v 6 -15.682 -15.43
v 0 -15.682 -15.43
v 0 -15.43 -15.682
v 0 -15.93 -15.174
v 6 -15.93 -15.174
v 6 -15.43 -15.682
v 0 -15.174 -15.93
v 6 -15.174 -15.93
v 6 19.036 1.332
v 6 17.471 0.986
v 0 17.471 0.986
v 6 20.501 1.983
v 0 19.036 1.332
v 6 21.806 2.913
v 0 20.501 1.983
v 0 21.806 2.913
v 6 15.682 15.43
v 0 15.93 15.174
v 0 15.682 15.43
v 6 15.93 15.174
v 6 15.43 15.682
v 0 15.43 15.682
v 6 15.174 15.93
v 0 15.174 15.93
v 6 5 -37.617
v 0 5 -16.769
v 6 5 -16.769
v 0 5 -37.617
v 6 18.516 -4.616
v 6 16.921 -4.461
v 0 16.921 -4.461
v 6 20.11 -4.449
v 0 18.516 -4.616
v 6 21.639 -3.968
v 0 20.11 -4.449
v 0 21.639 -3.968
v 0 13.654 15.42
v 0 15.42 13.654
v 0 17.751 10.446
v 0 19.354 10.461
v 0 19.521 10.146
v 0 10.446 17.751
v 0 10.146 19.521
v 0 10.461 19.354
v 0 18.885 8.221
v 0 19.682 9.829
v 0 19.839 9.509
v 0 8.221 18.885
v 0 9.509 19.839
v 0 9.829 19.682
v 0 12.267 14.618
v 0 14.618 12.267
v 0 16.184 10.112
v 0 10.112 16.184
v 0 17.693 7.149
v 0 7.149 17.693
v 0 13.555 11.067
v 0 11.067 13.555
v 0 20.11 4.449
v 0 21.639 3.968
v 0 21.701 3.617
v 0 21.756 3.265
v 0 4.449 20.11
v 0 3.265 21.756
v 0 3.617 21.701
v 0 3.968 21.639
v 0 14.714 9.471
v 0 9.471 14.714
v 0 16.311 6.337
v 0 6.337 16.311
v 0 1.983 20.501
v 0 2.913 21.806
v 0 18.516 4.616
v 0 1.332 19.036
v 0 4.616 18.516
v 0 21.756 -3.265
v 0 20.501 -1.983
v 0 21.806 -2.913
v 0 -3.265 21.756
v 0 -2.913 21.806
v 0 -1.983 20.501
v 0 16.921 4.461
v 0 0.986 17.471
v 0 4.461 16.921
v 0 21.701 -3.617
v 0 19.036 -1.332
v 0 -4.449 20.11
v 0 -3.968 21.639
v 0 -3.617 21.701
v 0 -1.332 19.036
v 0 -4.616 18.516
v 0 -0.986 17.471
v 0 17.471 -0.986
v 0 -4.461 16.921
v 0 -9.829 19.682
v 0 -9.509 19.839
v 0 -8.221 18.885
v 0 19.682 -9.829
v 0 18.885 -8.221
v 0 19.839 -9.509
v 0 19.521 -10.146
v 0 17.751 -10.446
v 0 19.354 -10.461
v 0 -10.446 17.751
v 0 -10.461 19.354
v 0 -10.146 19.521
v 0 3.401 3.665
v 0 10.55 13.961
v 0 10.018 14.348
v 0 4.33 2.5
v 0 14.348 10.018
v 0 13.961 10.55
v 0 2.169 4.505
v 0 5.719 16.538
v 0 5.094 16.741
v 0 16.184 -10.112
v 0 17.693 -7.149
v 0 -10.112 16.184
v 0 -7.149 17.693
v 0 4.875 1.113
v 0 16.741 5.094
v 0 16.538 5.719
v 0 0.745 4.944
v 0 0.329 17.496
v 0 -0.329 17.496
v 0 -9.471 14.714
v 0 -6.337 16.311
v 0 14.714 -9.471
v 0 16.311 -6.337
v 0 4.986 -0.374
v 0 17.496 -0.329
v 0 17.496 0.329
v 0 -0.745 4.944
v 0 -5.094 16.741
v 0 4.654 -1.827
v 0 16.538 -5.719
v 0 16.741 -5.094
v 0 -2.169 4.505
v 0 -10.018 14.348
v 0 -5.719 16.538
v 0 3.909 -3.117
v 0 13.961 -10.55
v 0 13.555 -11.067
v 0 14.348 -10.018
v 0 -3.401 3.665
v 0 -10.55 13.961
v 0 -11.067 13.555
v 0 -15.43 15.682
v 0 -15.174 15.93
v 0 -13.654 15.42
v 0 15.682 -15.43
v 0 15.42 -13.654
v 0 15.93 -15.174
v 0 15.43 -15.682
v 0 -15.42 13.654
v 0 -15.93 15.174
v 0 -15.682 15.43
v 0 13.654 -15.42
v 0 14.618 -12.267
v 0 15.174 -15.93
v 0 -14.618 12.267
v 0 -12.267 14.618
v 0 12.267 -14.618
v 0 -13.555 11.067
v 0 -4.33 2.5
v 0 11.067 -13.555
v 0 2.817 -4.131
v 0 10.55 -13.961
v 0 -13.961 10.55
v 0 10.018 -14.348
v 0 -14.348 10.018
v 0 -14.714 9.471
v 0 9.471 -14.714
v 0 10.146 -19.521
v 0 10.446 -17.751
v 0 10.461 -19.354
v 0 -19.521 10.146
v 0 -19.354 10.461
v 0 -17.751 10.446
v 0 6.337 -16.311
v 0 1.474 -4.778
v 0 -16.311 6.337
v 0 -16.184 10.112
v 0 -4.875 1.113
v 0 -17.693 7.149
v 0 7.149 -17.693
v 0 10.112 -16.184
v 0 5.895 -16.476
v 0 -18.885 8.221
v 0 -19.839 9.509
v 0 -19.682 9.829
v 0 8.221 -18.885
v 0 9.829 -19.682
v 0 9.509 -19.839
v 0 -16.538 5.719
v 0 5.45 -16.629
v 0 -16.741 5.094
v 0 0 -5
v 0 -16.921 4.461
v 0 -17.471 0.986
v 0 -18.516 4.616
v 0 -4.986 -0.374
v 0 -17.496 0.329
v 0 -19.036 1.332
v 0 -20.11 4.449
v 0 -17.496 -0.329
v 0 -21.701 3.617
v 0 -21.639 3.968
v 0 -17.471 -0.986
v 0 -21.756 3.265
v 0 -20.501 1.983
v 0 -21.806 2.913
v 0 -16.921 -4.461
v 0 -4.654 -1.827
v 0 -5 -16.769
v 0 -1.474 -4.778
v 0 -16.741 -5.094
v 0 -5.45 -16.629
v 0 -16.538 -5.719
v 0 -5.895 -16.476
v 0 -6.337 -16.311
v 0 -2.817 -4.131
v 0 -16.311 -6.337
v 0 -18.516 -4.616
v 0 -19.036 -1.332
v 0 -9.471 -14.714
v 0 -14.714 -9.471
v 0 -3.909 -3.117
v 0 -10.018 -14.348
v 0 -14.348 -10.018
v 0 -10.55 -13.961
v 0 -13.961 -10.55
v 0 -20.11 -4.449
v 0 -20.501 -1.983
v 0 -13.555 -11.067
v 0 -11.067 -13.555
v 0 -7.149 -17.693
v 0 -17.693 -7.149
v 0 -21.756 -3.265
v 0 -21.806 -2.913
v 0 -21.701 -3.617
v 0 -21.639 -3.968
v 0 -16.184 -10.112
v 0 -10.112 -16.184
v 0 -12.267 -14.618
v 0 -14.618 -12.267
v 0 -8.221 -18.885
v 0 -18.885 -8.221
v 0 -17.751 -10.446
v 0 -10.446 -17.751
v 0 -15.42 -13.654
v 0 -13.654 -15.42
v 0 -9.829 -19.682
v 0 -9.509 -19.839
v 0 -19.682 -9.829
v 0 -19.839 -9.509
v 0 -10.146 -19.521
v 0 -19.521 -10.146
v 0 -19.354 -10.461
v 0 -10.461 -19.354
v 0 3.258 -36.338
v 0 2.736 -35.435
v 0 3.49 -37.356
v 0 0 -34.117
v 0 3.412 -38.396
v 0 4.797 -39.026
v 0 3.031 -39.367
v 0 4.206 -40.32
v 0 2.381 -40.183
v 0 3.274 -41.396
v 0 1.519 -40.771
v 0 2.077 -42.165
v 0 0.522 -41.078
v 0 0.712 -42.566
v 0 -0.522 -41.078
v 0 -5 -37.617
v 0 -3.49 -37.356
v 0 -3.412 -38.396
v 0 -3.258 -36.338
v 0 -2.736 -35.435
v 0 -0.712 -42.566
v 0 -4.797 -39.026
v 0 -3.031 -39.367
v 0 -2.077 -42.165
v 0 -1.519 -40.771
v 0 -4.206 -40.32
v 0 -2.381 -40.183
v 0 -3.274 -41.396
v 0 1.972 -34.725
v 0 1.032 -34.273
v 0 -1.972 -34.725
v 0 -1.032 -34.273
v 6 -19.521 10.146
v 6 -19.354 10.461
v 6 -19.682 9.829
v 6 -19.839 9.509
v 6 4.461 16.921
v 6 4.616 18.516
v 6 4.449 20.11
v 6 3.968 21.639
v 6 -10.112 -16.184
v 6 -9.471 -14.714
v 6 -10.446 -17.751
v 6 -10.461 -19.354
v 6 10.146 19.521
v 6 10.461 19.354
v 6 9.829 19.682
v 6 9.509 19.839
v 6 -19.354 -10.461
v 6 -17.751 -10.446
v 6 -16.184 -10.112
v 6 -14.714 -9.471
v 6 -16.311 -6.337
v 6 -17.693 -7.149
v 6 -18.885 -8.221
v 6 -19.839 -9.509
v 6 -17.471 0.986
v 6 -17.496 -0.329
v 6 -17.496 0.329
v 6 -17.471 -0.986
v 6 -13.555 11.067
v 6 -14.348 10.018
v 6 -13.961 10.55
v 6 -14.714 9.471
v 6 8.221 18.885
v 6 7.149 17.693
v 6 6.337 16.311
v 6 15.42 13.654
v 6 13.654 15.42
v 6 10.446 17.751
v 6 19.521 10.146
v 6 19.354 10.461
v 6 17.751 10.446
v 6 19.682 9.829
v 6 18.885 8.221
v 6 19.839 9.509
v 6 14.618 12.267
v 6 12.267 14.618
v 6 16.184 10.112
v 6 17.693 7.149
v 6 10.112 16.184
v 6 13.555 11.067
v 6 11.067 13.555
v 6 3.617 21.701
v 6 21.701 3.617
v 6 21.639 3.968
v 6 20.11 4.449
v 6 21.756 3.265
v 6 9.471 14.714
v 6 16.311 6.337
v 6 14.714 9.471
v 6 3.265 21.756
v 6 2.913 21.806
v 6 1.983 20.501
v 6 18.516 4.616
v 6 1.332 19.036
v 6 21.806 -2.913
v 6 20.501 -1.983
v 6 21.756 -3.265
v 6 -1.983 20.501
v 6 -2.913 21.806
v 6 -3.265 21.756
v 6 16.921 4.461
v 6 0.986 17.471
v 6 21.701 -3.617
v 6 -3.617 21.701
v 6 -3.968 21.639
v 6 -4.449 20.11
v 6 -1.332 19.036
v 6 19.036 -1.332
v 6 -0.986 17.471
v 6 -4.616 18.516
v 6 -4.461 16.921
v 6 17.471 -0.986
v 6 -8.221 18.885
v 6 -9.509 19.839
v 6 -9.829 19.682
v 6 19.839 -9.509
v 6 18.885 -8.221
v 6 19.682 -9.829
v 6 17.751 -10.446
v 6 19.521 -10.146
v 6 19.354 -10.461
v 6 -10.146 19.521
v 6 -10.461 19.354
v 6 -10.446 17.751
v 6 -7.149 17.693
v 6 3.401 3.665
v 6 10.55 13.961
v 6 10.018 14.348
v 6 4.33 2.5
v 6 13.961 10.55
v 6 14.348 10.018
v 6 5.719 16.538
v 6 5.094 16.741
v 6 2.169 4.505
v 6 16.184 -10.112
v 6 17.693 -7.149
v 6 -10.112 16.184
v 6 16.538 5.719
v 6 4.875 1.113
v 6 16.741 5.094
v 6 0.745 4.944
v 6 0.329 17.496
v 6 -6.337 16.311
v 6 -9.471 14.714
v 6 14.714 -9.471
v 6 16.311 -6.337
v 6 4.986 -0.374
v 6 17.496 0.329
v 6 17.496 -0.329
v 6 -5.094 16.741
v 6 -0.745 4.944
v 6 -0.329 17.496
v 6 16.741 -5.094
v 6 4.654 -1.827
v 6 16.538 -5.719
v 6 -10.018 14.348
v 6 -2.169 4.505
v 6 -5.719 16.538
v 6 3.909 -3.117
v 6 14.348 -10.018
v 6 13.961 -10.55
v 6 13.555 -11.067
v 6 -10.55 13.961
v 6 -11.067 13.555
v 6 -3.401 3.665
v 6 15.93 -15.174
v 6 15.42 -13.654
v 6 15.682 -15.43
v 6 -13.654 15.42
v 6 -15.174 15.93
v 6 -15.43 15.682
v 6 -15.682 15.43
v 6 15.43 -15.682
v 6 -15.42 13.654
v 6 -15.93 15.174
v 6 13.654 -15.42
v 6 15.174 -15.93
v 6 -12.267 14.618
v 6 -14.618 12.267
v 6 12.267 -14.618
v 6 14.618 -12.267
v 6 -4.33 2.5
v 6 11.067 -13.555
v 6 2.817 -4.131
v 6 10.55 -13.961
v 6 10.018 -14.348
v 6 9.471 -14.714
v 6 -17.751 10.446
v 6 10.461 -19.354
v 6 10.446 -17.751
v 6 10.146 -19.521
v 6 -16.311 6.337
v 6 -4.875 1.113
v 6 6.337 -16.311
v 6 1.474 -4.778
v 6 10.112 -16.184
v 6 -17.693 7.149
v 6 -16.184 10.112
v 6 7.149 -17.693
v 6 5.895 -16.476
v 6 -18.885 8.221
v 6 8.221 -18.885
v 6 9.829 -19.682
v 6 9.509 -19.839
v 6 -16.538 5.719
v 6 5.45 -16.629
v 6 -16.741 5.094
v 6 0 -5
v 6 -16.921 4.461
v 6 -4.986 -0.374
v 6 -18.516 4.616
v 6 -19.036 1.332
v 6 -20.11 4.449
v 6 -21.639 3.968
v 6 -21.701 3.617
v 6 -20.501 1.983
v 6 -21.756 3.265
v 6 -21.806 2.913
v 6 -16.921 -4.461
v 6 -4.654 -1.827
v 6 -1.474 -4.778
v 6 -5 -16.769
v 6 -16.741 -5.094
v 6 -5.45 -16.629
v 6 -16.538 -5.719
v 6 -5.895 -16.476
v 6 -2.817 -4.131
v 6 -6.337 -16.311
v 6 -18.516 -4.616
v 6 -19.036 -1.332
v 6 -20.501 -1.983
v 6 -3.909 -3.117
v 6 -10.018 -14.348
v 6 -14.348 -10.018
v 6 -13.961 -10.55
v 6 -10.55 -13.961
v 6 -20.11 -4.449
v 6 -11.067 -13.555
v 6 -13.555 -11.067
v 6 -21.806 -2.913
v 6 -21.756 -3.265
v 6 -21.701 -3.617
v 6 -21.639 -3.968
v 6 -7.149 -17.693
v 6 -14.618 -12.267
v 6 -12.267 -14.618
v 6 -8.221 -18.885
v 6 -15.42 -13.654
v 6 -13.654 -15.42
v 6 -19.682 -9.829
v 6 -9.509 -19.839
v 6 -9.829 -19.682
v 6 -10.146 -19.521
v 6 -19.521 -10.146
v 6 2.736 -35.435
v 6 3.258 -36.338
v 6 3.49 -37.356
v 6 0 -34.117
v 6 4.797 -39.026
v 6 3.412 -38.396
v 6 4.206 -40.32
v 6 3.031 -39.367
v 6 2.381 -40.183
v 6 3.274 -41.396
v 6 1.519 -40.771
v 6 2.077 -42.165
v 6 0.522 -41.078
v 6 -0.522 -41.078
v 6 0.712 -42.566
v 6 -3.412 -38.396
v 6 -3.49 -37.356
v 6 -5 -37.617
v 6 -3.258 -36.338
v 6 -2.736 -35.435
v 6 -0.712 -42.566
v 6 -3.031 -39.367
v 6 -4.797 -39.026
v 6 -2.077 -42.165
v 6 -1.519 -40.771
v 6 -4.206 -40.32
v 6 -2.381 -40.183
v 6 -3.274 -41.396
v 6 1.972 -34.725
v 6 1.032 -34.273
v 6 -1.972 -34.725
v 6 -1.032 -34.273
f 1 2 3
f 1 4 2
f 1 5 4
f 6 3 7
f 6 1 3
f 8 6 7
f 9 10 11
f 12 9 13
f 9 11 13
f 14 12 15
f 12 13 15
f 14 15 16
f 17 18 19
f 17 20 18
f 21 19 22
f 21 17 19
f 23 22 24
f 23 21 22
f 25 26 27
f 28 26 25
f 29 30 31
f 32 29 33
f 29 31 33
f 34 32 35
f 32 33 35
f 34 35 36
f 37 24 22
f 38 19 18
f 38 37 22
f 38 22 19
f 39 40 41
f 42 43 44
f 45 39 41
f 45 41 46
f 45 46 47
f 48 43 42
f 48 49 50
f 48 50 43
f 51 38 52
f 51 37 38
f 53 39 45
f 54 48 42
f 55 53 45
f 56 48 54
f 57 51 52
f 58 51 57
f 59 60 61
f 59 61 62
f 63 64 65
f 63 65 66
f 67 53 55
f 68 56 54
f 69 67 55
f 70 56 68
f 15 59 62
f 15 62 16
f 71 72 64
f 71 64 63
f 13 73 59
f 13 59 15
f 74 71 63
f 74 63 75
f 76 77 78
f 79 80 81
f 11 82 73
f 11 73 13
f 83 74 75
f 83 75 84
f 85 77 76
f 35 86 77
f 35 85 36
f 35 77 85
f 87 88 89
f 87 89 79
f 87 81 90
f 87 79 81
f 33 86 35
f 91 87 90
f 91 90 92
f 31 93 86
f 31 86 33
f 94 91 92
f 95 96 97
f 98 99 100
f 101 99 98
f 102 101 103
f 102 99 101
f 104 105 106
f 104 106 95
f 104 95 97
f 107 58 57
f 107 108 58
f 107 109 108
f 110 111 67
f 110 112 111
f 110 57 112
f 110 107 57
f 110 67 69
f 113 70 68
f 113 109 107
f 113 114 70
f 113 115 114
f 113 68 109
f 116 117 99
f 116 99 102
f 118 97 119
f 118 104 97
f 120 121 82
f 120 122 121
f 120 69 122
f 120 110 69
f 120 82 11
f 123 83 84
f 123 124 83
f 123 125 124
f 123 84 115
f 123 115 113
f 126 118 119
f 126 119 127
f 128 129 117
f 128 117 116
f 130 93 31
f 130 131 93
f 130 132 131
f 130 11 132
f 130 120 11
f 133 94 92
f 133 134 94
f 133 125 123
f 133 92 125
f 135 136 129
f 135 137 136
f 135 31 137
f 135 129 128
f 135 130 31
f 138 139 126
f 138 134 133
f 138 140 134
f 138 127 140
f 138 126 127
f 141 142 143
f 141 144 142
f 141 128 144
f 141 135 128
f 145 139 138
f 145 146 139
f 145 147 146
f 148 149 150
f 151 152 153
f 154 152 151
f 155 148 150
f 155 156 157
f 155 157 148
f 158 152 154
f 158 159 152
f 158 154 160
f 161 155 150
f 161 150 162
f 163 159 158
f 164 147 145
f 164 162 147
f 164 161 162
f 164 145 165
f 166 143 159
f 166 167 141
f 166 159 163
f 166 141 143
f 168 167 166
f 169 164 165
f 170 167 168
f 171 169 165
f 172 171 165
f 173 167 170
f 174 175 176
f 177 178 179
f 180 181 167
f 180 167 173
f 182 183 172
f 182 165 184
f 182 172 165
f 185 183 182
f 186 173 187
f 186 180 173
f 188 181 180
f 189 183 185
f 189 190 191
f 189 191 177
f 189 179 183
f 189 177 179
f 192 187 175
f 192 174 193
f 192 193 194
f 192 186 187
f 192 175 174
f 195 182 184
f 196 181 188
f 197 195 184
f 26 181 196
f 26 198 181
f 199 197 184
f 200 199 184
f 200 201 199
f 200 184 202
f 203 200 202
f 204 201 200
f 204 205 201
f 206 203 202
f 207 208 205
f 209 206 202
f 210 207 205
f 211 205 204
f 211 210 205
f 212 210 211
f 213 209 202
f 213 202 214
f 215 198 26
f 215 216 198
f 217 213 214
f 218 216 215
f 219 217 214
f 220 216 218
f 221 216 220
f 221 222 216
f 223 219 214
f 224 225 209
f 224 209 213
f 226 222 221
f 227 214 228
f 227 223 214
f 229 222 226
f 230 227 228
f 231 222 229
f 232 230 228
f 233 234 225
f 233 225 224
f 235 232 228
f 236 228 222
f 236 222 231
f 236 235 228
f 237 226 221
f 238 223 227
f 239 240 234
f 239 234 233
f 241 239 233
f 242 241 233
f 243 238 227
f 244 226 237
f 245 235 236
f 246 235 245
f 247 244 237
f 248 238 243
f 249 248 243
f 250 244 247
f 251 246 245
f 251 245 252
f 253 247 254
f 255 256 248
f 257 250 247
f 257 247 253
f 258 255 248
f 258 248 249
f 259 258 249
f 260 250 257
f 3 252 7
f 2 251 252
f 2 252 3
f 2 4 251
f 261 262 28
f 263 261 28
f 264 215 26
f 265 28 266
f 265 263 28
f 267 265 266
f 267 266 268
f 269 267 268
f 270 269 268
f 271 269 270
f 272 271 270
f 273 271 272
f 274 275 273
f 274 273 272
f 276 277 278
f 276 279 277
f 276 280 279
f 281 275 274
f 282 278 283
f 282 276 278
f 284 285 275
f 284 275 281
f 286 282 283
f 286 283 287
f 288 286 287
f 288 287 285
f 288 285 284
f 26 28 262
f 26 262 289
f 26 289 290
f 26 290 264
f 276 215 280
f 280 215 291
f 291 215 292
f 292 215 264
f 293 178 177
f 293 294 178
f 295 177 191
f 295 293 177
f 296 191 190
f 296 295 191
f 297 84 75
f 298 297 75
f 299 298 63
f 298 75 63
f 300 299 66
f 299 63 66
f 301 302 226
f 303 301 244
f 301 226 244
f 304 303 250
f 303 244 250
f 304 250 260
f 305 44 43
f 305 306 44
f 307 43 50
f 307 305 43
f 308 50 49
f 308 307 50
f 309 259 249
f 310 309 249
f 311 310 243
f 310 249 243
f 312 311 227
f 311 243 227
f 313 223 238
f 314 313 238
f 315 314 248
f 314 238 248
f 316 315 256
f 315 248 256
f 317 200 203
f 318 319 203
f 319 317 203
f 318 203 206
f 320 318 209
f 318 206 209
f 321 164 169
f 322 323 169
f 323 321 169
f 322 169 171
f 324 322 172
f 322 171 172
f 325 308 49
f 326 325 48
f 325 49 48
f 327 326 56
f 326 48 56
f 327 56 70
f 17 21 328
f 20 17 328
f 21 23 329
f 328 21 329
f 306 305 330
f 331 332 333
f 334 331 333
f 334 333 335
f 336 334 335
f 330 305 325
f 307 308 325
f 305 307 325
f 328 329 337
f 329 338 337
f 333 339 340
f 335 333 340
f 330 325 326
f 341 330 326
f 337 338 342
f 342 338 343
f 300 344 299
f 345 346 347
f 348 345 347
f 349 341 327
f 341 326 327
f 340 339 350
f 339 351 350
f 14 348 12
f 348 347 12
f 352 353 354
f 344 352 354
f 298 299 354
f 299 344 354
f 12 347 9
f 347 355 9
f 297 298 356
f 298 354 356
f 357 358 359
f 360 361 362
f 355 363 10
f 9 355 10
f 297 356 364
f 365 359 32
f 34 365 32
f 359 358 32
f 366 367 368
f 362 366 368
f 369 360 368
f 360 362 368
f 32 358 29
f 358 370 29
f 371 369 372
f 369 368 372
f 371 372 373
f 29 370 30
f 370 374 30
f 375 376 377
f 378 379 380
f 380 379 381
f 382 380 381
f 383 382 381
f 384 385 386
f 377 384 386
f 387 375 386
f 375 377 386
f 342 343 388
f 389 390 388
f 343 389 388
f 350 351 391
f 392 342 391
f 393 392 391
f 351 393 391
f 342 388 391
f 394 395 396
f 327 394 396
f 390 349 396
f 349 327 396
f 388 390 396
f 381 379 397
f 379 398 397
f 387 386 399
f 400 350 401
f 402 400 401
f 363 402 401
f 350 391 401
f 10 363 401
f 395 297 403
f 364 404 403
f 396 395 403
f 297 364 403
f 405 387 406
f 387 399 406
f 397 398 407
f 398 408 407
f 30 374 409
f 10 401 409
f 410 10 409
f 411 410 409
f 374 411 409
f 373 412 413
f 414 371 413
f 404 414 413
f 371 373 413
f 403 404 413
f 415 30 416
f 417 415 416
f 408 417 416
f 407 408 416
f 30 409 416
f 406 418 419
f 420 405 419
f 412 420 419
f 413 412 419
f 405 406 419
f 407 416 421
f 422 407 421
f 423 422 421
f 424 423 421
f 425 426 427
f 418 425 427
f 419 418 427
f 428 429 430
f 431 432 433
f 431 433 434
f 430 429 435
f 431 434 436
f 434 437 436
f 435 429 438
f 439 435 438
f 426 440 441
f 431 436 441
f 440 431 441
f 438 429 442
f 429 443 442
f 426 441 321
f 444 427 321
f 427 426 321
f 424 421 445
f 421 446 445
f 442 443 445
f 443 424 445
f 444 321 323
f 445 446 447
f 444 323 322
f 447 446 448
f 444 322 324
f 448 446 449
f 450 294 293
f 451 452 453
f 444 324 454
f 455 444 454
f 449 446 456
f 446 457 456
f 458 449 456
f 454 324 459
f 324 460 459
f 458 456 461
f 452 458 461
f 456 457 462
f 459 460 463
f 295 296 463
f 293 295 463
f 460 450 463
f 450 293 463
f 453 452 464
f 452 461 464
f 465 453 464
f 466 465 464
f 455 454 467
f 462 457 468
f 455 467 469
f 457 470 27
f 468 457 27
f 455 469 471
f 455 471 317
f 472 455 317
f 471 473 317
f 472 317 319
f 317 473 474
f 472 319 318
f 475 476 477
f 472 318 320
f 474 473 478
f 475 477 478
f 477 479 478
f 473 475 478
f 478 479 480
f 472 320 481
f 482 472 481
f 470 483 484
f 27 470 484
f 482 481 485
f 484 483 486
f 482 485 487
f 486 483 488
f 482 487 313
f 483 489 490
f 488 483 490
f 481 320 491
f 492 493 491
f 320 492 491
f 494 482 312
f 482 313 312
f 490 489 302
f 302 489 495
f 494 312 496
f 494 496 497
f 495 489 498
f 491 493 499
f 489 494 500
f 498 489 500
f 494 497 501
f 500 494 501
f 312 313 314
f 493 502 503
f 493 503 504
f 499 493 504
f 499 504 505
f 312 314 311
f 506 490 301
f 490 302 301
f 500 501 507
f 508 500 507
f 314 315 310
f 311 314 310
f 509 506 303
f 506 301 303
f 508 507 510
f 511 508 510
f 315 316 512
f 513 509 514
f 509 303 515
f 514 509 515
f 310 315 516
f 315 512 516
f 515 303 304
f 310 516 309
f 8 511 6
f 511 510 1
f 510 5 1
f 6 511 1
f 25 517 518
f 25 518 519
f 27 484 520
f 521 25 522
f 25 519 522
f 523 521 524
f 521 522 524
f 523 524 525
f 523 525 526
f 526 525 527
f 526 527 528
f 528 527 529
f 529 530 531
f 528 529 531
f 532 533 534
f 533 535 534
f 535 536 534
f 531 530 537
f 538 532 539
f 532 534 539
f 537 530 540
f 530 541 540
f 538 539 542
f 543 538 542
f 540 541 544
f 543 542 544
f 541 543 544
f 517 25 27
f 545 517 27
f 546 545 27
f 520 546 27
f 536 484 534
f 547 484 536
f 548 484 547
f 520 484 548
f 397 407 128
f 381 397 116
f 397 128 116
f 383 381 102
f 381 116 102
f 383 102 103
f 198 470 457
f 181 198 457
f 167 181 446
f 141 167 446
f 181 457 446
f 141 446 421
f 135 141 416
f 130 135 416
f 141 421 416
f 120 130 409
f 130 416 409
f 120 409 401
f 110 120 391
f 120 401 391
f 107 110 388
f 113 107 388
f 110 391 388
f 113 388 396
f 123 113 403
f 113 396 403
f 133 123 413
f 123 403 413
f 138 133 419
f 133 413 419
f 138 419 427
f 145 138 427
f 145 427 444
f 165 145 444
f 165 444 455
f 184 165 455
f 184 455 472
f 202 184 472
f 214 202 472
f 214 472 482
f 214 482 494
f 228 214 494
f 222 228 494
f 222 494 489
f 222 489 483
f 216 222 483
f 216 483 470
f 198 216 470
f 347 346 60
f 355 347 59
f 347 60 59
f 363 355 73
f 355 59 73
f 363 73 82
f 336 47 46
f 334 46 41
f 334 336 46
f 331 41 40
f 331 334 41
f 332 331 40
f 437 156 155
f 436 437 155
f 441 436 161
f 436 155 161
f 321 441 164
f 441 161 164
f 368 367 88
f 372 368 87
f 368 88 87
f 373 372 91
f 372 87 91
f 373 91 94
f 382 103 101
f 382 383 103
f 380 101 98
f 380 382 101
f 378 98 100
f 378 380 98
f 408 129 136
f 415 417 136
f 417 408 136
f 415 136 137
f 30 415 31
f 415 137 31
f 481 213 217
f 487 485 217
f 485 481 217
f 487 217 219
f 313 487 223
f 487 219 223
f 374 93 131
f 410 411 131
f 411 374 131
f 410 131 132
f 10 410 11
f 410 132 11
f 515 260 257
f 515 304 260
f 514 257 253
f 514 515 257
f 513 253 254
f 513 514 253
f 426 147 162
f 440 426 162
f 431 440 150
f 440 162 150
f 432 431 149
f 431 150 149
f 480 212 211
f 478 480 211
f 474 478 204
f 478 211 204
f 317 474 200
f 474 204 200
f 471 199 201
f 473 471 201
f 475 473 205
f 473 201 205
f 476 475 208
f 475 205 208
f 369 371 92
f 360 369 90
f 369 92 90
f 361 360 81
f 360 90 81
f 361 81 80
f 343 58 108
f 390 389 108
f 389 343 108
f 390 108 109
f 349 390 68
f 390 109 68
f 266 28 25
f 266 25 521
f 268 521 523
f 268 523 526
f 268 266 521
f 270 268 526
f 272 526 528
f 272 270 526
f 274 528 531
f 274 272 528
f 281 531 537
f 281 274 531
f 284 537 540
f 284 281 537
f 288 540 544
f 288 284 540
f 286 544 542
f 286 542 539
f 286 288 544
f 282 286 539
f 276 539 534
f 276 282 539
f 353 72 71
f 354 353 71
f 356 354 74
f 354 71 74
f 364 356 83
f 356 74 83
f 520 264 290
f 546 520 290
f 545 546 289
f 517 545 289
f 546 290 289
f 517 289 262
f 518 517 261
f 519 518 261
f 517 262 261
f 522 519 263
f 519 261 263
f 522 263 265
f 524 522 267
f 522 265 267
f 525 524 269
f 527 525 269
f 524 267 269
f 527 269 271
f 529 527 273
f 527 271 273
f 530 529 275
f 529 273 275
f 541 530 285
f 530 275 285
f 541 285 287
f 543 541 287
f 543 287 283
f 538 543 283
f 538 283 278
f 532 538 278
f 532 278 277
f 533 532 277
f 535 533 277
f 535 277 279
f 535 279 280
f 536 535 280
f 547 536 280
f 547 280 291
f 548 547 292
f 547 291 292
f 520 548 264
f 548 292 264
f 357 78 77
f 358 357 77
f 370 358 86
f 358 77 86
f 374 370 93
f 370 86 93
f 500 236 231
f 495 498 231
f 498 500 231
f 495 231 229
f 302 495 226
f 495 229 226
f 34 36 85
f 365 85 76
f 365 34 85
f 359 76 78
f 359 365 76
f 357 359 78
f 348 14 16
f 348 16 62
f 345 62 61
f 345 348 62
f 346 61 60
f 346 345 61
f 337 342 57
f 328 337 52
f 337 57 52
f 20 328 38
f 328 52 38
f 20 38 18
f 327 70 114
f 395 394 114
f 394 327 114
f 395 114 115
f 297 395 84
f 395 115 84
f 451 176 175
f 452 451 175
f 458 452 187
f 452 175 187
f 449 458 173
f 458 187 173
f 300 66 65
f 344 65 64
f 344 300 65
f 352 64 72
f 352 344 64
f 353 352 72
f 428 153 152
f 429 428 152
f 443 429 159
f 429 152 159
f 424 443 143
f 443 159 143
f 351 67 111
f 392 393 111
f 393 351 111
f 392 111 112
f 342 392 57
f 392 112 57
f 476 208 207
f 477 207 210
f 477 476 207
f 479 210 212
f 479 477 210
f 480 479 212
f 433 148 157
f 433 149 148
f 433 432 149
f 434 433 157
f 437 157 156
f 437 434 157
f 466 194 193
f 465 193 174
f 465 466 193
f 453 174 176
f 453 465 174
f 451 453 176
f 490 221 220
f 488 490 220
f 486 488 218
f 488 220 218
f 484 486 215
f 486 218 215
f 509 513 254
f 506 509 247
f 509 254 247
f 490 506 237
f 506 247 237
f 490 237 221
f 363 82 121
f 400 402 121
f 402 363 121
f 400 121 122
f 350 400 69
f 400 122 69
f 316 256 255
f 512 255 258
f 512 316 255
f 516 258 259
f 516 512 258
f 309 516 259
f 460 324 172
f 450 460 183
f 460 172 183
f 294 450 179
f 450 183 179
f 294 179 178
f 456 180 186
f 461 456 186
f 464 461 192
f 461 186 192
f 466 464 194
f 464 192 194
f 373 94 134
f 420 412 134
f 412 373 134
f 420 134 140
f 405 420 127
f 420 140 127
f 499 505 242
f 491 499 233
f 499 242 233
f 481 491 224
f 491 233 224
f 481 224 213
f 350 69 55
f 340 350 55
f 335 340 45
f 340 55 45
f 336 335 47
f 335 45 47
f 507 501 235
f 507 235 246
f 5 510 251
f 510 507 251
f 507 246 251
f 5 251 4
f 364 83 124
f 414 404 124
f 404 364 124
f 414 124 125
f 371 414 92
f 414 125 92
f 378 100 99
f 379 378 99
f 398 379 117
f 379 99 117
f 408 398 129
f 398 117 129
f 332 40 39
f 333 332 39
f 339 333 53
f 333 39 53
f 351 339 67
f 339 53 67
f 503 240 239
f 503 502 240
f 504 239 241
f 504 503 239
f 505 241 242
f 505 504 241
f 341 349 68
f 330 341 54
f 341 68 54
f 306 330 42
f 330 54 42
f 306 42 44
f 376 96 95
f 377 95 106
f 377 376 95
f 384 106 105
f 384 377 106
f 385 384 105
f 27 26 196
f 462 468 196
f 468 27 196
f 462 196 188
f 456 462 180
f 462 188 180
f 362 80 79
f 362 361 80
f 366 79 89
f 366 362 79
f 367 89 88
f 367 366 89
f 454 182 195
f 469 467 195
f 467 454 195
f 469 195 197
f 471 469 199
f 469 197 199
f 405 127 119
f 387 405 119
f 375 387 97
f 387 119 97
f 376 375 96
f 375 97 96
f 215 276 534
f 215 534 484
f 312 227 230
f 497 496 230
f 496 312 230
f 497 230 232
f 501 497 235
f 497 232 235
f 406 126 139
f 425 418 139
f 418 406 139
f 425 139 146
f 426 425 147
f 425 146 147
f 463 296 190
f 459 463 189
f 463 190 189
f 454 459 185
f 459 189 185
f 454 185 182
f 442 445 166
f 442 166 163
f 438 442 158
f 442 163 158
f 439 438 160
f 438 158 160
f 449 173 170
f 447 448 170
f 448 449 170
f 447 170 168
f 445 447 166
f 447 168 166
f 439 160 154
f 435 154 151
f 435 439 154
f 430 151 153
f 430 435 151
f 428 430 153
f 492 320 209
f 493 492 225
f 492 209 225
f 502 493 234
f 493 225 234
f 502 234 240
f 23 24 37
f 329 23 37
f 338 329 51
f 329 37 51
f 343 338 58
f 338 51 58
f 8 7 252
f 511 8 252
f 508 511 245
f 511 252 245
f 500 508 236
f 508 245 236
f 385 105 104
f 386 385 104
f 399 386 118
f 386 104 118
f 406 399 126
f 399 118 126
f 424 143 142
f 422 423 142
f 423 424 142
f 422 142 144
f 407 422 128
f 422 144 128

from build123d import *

# Parameters (mm, degrees)
BASPROSKE_W         = 6
BASPROSKE_H         = 22
TOOTHCUT_DEPTH      = 32.685959036
TEETHCUTS_COUNT     = 20
TEETHCUTS_ANGLE     = 342
BORSKE_R            = 2
BORE_DEPTH          = 50.0000508
SKETCH1_R           = 5
CUT_EXTRUDE1_DEPTH  = 32.417071791
BOSS_EXTRUDE1_DEPTH = 6
SKETCH3_R           = 3.5
CUT_EXTRUDE2_DEPTH  = 6


with BuildPart() as part:
    # BasProSke → Base-Revolve (revolve)
    with BuildSketch(Plane(origin=(0, 0, 0), x_dir=(1, 0, 0), z_dir=(0, 1, 0)), mode=Mode.PRIVATE) as base_revolve_sk:
        with Locations((3, 11)):
            Rectangle(BASPROSKE_W, BASPROSKE_H)
    revolve(base_revolve_sk.sketch.rotate(Axis((-10, 0, 0), (1, 0, 0)), 180), axis=Axis((-10, 0, 0), (1, 0, 0)))

    # TooCutSke → ToothCut (cut, through all)
    with BuildSketch(Plane(origin=(0, 0, 0), x_dir=(0, 0, -1), z_dir=(1, 0, 0))):
        with BuildLine():
            ThreePointArc((0.986171591, 17.471189616), (0, 17.499), (-0.986171591, 17.471189616))
            ThreePointArc((-0.986171591, 17.471189616), (-1.626916196, 19.798789858), (-2.932850173, 21.829260982))
            ThreePointArc((-2.932850173, 21.829260982), (0, 22.0254), (2.932850173, 21.829260982))
            ThreePointArc((2.932850173, 21.829260982), (1.626916196, 19.798789858), (0.986171591, 17.471189616))
        make_face()
    toothcut = extrude(amount=TOOTHCUT_DEPTH, mode=Mode.SUBTRACT)

    # TeethCuts: ToothCut ×20 about axis
    teethcuts_axis = Axis((-10, 0, 0), (1, 0, 0))
    for i in range(1, TEETHCUTS_COUNT):
        add(toothcut.rotate(teethcuts_axis, i * TEETHCUTS_ANGLE / (TEETHCUTS_COUNT - 1)), mode=Mode.SUBTRACT)

    # BorSke → Bore (cut, symmetric)
    with BuildSketch(Plane(origin=(0, 0, 0), x_dir=(0, 0, -1), z_dir=(1, 0, 0))):
        with Locations(Location((0, 0, 0), (0, 0, 180))):
            Circle(BORSKE_R)
    extrude(amount=BORE_DEPTH, both=True, mode=Mode.SUBTRACT)

    # Sketch1 → Cut-Extrude1 (cut, through all)
    with BuildSketch(Plane(origin=(6, 0, 0), x_dir=(0, 0, -1), z_dir=(1, 0, 0))):
        Circle(SKETCH1_R)
    extrude(amount=-CUT_EXTRUDE1_DEPTH, mode=Mode.SUBTRACT)

    # Sketch2 → Boss-Extrude1 (add)
    with BuildSketch(Plane.ZY):
        with BuildLine():
            Line((-37.617140139, -5), (-8.966472533, -5))
            Line((-8.966472533, -5), (-8.966472533, 5))
            Line((-8.966472533, 5), (-37.617140139, 5))
            ThreePointArc((-37.617140139, 5), (-34.081606234, 3.535533906), (-32.617140139, 0))
            ThreePointArc((-32.617140139, 0), (-34.081606234, -3.535533906), (-37.617140139, -5))
        make_face()
        with BuildLine():
            ThreePointArc((-37.617140139, 5), (-42.617140139, 0), (-37.617140139, -5))
            Line((-37.617140139, -5), (-37.617140139, 5))
        make_face()
        with BuildLine():
            Line((-37.617140139, 5), (-37.617140139, -5))
            ThreePointArc((-37.617140139, -5), (-34.081606234, -3.535533906), (-32.617140139, 0))
            ThreePointArc((-32.617140139, 0), (-34.081606234, 3.535533906), (-37.617140139, 5))
        make_face()
    extrude(amount=-BOSS_EXTRUDE1_DEPTH)

    # Sketch3 → Cut-Extrude2 (cut)
    with BuildSketch(Plane.ZY):
        with Locations((-37.617140139, 0)):
            Circle(SKETCH3_R)
    extrude(amount=-CUT_EXTRUDE2_DEPTH, mode=Mode.SUBTRACT)


solid = part.part
